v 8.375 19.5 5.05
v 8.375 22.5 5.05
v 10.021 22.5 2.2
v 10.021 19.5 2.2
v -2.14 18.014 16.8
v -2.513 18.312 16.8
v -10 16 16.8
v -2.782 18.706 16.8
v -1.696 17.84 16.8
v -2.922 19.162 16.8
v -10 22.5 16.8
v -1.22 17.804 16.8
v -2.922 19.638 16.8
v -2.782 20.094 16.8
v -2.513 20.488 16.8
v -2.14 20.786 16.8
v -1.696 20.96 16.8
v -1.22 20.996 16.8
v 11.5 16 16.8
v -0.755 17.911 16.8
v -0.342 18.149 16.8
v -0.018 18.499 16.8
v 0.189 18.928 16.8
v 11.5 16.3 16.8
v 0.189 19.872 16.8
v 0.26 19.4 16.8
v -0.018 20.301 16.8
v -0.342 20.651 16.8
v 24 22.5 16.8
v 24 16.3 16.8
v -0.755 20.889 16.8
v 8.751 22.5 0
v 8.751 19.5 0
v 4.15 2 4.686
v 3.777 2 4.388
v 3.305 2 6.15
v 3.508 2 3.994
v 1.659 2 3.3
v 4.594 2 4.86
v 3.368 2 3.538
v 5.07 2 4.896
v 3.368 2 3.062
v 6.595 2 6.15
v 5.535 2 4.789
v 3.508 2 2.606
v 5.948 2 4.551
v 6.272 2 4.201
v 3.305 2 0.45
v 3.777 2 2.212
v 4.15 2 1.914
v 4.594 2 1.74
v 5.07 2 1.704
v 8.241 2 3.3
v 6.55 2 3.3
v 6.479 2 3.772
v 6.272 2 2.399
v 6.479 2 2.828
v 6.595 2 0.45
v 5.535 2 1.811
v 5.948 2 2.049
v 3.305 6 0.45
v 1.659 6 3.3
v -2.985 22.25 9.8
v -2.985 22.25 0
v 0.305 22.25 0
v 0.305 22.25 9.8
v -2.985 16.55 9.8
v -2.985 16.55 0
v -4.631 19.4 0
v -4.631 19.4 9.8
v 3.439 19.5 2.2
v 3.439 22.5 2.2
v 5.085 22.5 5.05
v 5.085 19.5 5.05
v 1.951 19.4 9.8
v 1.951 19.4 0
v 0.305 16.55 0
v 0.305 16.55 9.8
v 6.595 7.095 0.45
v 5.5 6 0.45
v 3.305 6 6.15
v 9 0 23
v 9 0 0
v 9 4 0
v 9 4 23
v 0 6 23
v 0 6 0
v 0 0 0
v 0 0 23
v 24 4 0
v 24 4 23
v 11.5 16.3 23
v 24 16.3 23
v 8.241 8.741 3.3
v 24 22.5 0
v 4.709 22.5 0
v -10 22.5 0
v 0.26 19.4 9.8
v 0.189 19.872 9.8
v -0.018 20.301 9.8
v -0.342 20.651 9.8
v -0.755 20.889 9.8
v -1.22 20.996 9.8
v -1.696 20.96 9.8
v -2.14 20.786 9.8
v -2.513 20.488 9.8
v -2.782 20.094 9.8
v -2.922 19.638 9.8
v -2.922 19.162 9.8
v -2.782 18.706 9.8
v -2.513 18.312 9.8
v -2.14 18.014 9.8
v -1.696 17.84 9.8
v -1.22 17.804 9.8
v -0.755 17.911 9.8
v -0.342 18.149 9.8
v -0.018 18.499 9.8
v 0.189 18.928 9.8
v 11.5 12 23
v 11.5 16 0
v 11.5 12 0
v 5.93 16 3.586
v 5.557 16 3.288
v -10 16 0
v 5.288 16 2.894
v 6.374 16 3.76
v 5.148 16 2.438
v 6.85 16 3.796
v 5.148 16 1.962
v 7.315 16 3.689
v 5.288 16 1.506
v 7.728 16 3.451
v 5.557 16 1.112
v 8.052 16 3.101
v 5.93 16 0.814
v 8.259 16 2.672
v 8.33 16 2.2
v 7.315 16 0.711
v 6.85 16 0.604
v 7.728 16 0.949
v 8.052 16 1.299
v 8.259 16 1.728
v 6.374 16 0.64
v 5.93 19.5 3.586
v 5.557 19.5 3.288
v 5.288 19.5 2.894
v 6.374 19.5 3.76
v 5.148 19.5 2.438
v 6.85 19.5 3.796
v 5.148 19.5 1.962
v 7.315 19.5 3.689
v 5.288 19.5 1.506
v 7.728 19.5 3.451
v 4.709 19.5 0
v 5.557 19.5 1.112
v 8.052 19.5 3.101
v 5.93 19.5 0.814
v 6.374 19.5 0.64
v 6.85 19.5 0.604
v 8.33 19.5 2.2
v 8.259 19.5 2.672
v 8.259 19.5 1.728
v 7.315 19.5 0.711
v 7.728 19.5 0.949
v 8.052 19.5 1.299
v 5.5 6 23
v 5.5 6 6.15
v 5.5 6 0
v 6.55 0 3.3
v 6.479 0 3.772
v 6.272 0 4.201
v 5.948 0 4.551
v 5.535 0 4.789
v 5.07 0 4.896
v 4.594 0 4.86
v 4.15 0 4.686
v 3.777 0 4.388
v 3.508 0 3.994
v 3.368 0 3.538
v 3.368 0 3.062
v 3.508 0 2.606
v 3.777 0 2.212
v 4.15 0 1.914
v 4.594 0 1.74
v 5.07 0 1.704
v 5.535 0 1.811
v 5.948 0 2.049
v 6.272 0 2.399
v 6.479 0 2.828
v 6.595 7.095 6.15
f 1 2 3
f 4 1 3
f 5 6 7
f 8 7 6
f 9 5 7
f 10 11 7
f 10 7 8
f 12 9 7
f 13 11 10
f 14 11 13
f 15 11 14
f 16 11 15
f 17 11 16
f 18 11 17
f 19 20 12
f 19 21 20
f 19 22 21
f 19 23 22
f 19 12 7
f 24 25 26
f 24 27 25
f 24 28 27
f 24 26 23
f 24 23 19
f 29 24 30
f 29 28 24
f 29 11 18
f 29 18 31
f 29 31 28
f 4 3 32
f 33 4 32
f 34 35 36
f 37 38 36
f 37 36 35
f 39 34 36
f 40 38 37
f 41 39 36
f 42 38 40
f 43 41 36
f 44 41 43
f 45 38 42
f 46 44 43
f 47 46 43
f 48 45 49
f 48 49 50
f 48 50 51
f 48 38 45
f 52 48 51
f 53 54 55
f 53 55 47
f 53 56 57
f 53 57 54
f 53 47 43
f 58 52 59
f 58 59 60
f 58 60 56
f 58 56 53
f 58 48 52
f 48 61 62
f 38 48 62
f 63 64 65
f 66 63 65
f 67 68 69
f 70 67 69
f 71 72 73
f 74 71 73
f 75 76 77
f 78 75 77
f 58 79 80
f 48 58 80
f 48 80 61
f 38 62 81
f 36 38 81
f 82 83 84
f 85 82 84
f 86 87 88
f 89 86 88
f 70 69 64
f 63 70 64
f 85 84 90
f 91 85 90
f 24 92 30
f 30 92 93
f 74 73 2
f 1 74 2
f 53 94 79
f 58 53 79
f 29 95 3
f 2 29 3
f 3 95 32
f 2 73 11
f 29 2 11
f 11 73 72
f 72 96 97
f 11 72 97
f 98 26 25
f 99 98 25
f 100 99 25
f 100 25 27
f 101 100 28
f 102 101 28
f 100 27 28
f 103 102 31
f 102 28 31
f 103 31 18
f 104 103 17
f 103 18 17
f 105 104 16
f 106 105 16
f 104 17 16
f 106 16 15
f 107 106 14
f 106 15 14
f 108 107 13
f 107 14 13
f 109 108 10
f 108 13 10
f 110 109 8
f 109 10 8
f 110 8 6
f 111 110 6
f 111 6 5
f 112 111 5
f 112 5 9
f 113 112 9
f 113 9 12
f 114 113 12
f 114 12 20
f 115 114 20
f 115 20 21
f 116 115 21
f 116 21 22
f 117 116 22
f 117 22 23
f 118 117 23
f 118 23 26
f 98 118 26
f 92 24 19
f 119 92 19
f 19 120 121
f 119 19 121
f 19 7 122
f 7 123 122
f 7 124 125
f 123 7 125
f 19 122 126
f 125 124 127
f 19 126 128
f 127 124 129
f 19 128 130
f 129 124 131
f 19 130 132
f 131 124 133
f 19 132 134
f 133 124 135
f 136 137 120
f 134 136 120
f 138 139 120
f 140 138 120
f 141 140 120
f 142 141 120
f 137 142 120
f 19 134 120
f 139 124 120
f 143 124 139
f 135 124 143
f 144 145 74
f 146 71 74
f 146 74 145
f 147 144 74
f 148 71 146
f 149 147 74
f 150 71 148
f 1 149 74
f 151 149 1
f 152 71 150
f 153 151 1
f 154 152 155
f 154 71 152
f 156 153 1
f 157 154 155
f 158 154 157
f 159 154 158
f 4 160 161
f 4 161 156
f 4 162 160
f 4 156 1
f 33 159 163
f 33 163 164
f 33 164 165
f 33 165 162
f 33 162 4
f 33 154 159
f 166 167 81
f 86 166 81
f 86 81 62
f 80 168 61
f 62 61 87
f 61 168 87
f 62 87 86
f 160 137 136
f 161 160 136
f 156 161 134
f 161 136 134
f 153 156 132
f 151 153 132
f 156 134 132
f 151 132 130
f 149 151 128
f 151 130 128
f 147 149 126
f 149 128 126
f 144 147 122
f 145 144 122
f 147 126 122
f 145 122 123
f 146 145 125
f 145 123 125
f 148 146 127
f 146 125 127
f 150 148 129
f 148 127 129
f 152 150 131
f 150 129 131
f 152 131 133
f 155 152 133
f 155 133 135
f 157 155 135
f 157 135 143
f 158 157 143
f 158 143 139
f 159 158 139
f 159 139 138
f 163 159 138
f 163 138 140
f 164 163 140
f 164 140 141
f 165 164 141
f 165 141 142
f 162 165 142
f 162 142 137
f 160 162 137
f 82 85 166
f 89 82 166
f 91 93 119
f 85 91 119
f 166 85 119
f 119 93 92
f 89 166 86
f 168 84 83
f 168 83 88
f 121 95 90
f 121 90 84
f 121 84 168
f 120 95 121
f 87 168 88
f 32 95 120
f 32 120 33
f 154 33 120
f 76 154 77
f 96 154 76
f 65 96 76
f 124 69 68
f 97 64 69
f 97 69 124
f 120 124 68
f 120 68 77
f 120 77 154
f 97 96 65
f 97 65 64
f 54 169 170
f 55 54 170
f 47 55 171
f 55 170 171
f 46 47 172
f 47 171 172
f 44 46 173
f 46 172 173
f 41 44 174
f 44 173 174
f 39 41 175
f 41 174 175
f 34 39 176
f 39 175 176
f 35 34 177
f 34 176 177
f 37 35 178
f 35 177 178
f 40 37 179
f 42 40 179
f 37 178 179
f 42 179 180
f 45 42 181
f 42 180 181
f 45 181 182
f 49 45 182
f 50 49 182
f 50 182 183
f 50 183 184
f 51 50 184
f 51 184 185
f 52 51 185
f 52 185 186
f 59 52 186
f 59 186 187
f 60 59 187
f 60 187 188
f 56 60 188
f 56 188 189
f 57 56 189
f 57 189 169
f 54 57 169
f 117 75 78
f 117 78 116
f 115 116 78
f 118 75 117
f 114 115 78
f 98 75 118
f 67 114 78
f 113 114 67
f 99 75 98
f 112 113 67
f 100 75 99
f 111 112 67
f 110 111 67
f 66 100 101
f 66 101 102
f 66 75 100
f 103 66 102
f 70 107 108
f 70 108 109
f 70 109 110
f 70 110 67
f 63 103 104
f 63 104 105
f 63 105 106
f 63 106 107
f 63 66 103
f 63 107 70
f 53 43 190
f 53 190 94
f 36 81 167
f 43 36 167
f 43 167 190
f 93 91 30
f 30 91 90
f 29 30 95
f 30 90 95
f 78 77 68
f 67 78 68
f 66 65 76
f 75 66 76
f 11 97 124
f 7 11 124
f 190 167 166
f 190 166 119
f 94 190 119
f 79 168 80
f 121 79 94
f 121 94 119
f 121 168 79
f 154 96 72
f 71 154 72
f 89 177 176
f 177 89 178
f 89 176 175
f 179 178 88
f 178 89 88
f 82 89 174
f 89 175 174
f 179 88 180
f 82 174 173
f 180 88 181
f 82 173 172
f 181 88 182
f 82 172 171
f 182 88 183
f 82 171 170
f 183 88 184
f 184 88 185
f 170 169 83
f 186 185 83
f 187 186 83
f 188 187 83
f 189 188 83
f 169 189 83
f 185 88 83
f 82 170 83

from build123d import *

# Parameters (mm, degrees)
SALIENTE_EXTRUIR1_DEPTH           = 23
CROQUIS2_W                        = 34
CROQUIS2_H                        = 6.2
CORTAR_EXTRUIR1_DEPTH             = 6.2
CROQUIS3_W                        = 21.5
CROQUIS3_H                        = 0.3
CORTAR_EXTRUIR2_DEPTH             = 6.2
CORTAR_EXTRUIR3_REACH             = 18.8
CROQUIS4_R                        = 1.6
CORTAR_EXTRUIR4_DEPTH             = 9.8
CORTAR_EXTRUIR5_REACH             = 8.5
CROQUIS6_R                        = 1.6
CORTAR_EXTRUIR6_REACH             = 24.5
CROQUIS7_R                        = 1.6
SALIENTE_EXTRUIR2_DEPTH           = 23
CORTAR_EXTRUIR7_DEPTH             = 4
CORTAR_EXTRUIR7_DIRECTION_2_REACH = 18.5
CORTAR_EXTRUIR8_DEPTH             = 3


with BuildPart() as part:
    # Croquis1 → Saliente-Extruir1 (new body)
    with BuildSketch(Plane.XY):
        Polygon((0, 0), (9, 0), (9, 4), (24, 4), (24, 22.5), (-10, 22.5), (-10, 16), (11.5, 16), (11.5, 6), (0, 6), align=None)
    extrude(amount=SALIENTE_EXTRUIR1_DEPTH)

    # Croquis2 → Cortar-Extruir1 (cut)
    with BuildSketch(Plane.XY.offset(23)):
        with Locations((7, 19.4)):
            Rectangle(CROQUIS2_W, CROQUIS2_H)
    extrude(amount=-CORTAR_EXTRUIR1_DEPTH, mode=Mode.SUBTRACT)

    # Croquis3 → Cortar-Extruir2 (cut)
    with BuildSketch(Plane.XY.offset(23)):
        with Locations((0.75, 16.15)):
            Rectangle(CROQUIS3_W, CROQUIS3_H)
    extrude(amount=-CORTAR_EXTRUIR2_DEPTH, mode=Mode.SUBTRACT)

    # Croquis4 → Cortar-Extruir3 (cut, up to next)
    with BuildSketch(Plane.XY.offset(16.8), mode=Mode.PRIVATE) as cortar_extruir3_sk1:
        with Locations((-1.34, 19.4)):
            Circle(CROQUIS4_R)
    cortar_extruir3_tool1 = extrude(cortar_extruir3_sk1.sketch, amount=-CORTAR_EXTRUIR3_REACH, mode=Mode.PRIVATE) & part.part
    add(cortar_extruir3_tool1.solids().sort_by_distance((-1.34, 19.4, 16.8))[0], mode=Mode.SUBTRACT)

    # Croquis5 → Cortar-Extruir4 (cut)
    with BuildSketch(Plane(origin=(0, 0, 0), x_dir=(-1, 0, 0), z_dir=(0, 0, -1))):
        Polygon((-1.950896534, 19.4), (-0.305448267, 16.55), (2.985448267, 16.55), (4.630896534, 19.4), (2.985448267, 22.25), (-0.305448267, 22.25), align=None)
    extrude(amount=-CORTAR_EXTRUIR4_DEPTH, mode=Mode.SUBTRACT)

    # Croquis6 → Cortar-Extruir5 (cut, up to next)
    with BuildSketch(Plane.XZ.offset(-16), mode=Mode.PRIVATE) as cortar_extruir5_sk1:
        with Locations((6.73, 2.2)):
            Circle(CROQUIS6_R)
    cortar_extruir5_tool1 = extrude(cortar_extruir5_sk1.sketch, amount=-CORTAR_EXTRUIR5_REACH, mode=Mode.PRIVATE) & part.part
    add(cortar_extruir5_tool1.solids().sort_by_distance((6.73, 16, 2.2))[0], mode=Mode.SUBTRACT)

    # Croquis7 → Cortar-Extruir6 (cut, up to next)
    with BuildSketch(Plane.XZ, mode=Mode.PRIVATE) as cortar_extruir6_sk1:
        with Locations((4.95, 3.3)):
            Circle(CROQUIS7_R)
    cortar_extruir6_tool1 = extrude(cortar_extruir6_sk1.sketch, amount=-CORTAR_EXTRUIR6_REACH, mode=Mode.PRIVATE) & part.part
    add(cortar_extruir6_tool1.solids().sort_by_distance((4.95, 0, 3.3))[0], mode=Mode.SUBTRACT)

    # Croquis10 → Saliente-Extruir2 (add)
    with BuildSketch(Plane(origin=(0, 0, 0), x_dir=(-1, 0, 0), z_dir=(0, 0, -1))):
        Polygon((-11.5, 6), (-5.5, 6), (-11.5, 12), align=None)
    extrude(amount=-SALIENTE_EXTRUIR2_DEPTH)

    # Croquis8 → Cortar-Extruir7 (cut)
    with BuildSketch(Plane(origin=(0, 6, 0), x_dir=(1, 0, 0), z_dir=(0, 1, 0))):
        Polygon((1.659103466, -3.3), (3.304551733, -6.15), (6.595448267, -6.15), (8.240896534, -3.3), (6.595448267, -0.45), (3.304551733, -0.45), align=None)
    extrude(amount=-CORTAR_EXTRUIR7_DEPTH, mode=Mode.SUBTRACT)

    # Croquis8 → Cortar-Extruir7 direction 2 (cut, up to next)
    with BuildSketch(Plane(origin=(0, 6, 0), x_dir=(1, 0, 0), z_dir=(0, 1, 0)), mode=Mode.PRIVATE) as cortar_extruir7_direction_2_sk1:
        Polygon((1.659103466, -3.3), (3.304551733, -6.15), (6.595448267, -6.15), (8.240896534, -3.3), (6.595448267, -0.45), (3.304551733, -0.45), align=None)
    cortar_extruir7_direction_2_tool1 = extrude(cortar_extruir7_direction_2_sk1.sketch, amount=CORTAR_EXTRUIR7_DIRECTION_2_REACH, mode=Mode.PRIVATE) & part.part
    add(cortar_extruir7_direction_2_tool1.solids().sort_by_distance((4.95, 6, 3.3))[0], mode=Mode.SUBTRACT)

    # Croquis9 → Cortar-Extruir8 (cut)
    with BuildSketch(Plane(origin=(0, 22.5, 0), x_dir=(1, 0, 0), z_dir=(0, 1, 0))):
        Polygon((3.439103466, -2.2), (5.084551733, -5.05), (8.375448267, -5.05), (10.020896534, -2.2), (8.375448267, 0.65), (5.084551733, 0.65), align=None)
    extrude(amount=-CORTAR_EXTRUIR8_DEPTH, mode=Mode.SUBTRACT)


solid = part.part
